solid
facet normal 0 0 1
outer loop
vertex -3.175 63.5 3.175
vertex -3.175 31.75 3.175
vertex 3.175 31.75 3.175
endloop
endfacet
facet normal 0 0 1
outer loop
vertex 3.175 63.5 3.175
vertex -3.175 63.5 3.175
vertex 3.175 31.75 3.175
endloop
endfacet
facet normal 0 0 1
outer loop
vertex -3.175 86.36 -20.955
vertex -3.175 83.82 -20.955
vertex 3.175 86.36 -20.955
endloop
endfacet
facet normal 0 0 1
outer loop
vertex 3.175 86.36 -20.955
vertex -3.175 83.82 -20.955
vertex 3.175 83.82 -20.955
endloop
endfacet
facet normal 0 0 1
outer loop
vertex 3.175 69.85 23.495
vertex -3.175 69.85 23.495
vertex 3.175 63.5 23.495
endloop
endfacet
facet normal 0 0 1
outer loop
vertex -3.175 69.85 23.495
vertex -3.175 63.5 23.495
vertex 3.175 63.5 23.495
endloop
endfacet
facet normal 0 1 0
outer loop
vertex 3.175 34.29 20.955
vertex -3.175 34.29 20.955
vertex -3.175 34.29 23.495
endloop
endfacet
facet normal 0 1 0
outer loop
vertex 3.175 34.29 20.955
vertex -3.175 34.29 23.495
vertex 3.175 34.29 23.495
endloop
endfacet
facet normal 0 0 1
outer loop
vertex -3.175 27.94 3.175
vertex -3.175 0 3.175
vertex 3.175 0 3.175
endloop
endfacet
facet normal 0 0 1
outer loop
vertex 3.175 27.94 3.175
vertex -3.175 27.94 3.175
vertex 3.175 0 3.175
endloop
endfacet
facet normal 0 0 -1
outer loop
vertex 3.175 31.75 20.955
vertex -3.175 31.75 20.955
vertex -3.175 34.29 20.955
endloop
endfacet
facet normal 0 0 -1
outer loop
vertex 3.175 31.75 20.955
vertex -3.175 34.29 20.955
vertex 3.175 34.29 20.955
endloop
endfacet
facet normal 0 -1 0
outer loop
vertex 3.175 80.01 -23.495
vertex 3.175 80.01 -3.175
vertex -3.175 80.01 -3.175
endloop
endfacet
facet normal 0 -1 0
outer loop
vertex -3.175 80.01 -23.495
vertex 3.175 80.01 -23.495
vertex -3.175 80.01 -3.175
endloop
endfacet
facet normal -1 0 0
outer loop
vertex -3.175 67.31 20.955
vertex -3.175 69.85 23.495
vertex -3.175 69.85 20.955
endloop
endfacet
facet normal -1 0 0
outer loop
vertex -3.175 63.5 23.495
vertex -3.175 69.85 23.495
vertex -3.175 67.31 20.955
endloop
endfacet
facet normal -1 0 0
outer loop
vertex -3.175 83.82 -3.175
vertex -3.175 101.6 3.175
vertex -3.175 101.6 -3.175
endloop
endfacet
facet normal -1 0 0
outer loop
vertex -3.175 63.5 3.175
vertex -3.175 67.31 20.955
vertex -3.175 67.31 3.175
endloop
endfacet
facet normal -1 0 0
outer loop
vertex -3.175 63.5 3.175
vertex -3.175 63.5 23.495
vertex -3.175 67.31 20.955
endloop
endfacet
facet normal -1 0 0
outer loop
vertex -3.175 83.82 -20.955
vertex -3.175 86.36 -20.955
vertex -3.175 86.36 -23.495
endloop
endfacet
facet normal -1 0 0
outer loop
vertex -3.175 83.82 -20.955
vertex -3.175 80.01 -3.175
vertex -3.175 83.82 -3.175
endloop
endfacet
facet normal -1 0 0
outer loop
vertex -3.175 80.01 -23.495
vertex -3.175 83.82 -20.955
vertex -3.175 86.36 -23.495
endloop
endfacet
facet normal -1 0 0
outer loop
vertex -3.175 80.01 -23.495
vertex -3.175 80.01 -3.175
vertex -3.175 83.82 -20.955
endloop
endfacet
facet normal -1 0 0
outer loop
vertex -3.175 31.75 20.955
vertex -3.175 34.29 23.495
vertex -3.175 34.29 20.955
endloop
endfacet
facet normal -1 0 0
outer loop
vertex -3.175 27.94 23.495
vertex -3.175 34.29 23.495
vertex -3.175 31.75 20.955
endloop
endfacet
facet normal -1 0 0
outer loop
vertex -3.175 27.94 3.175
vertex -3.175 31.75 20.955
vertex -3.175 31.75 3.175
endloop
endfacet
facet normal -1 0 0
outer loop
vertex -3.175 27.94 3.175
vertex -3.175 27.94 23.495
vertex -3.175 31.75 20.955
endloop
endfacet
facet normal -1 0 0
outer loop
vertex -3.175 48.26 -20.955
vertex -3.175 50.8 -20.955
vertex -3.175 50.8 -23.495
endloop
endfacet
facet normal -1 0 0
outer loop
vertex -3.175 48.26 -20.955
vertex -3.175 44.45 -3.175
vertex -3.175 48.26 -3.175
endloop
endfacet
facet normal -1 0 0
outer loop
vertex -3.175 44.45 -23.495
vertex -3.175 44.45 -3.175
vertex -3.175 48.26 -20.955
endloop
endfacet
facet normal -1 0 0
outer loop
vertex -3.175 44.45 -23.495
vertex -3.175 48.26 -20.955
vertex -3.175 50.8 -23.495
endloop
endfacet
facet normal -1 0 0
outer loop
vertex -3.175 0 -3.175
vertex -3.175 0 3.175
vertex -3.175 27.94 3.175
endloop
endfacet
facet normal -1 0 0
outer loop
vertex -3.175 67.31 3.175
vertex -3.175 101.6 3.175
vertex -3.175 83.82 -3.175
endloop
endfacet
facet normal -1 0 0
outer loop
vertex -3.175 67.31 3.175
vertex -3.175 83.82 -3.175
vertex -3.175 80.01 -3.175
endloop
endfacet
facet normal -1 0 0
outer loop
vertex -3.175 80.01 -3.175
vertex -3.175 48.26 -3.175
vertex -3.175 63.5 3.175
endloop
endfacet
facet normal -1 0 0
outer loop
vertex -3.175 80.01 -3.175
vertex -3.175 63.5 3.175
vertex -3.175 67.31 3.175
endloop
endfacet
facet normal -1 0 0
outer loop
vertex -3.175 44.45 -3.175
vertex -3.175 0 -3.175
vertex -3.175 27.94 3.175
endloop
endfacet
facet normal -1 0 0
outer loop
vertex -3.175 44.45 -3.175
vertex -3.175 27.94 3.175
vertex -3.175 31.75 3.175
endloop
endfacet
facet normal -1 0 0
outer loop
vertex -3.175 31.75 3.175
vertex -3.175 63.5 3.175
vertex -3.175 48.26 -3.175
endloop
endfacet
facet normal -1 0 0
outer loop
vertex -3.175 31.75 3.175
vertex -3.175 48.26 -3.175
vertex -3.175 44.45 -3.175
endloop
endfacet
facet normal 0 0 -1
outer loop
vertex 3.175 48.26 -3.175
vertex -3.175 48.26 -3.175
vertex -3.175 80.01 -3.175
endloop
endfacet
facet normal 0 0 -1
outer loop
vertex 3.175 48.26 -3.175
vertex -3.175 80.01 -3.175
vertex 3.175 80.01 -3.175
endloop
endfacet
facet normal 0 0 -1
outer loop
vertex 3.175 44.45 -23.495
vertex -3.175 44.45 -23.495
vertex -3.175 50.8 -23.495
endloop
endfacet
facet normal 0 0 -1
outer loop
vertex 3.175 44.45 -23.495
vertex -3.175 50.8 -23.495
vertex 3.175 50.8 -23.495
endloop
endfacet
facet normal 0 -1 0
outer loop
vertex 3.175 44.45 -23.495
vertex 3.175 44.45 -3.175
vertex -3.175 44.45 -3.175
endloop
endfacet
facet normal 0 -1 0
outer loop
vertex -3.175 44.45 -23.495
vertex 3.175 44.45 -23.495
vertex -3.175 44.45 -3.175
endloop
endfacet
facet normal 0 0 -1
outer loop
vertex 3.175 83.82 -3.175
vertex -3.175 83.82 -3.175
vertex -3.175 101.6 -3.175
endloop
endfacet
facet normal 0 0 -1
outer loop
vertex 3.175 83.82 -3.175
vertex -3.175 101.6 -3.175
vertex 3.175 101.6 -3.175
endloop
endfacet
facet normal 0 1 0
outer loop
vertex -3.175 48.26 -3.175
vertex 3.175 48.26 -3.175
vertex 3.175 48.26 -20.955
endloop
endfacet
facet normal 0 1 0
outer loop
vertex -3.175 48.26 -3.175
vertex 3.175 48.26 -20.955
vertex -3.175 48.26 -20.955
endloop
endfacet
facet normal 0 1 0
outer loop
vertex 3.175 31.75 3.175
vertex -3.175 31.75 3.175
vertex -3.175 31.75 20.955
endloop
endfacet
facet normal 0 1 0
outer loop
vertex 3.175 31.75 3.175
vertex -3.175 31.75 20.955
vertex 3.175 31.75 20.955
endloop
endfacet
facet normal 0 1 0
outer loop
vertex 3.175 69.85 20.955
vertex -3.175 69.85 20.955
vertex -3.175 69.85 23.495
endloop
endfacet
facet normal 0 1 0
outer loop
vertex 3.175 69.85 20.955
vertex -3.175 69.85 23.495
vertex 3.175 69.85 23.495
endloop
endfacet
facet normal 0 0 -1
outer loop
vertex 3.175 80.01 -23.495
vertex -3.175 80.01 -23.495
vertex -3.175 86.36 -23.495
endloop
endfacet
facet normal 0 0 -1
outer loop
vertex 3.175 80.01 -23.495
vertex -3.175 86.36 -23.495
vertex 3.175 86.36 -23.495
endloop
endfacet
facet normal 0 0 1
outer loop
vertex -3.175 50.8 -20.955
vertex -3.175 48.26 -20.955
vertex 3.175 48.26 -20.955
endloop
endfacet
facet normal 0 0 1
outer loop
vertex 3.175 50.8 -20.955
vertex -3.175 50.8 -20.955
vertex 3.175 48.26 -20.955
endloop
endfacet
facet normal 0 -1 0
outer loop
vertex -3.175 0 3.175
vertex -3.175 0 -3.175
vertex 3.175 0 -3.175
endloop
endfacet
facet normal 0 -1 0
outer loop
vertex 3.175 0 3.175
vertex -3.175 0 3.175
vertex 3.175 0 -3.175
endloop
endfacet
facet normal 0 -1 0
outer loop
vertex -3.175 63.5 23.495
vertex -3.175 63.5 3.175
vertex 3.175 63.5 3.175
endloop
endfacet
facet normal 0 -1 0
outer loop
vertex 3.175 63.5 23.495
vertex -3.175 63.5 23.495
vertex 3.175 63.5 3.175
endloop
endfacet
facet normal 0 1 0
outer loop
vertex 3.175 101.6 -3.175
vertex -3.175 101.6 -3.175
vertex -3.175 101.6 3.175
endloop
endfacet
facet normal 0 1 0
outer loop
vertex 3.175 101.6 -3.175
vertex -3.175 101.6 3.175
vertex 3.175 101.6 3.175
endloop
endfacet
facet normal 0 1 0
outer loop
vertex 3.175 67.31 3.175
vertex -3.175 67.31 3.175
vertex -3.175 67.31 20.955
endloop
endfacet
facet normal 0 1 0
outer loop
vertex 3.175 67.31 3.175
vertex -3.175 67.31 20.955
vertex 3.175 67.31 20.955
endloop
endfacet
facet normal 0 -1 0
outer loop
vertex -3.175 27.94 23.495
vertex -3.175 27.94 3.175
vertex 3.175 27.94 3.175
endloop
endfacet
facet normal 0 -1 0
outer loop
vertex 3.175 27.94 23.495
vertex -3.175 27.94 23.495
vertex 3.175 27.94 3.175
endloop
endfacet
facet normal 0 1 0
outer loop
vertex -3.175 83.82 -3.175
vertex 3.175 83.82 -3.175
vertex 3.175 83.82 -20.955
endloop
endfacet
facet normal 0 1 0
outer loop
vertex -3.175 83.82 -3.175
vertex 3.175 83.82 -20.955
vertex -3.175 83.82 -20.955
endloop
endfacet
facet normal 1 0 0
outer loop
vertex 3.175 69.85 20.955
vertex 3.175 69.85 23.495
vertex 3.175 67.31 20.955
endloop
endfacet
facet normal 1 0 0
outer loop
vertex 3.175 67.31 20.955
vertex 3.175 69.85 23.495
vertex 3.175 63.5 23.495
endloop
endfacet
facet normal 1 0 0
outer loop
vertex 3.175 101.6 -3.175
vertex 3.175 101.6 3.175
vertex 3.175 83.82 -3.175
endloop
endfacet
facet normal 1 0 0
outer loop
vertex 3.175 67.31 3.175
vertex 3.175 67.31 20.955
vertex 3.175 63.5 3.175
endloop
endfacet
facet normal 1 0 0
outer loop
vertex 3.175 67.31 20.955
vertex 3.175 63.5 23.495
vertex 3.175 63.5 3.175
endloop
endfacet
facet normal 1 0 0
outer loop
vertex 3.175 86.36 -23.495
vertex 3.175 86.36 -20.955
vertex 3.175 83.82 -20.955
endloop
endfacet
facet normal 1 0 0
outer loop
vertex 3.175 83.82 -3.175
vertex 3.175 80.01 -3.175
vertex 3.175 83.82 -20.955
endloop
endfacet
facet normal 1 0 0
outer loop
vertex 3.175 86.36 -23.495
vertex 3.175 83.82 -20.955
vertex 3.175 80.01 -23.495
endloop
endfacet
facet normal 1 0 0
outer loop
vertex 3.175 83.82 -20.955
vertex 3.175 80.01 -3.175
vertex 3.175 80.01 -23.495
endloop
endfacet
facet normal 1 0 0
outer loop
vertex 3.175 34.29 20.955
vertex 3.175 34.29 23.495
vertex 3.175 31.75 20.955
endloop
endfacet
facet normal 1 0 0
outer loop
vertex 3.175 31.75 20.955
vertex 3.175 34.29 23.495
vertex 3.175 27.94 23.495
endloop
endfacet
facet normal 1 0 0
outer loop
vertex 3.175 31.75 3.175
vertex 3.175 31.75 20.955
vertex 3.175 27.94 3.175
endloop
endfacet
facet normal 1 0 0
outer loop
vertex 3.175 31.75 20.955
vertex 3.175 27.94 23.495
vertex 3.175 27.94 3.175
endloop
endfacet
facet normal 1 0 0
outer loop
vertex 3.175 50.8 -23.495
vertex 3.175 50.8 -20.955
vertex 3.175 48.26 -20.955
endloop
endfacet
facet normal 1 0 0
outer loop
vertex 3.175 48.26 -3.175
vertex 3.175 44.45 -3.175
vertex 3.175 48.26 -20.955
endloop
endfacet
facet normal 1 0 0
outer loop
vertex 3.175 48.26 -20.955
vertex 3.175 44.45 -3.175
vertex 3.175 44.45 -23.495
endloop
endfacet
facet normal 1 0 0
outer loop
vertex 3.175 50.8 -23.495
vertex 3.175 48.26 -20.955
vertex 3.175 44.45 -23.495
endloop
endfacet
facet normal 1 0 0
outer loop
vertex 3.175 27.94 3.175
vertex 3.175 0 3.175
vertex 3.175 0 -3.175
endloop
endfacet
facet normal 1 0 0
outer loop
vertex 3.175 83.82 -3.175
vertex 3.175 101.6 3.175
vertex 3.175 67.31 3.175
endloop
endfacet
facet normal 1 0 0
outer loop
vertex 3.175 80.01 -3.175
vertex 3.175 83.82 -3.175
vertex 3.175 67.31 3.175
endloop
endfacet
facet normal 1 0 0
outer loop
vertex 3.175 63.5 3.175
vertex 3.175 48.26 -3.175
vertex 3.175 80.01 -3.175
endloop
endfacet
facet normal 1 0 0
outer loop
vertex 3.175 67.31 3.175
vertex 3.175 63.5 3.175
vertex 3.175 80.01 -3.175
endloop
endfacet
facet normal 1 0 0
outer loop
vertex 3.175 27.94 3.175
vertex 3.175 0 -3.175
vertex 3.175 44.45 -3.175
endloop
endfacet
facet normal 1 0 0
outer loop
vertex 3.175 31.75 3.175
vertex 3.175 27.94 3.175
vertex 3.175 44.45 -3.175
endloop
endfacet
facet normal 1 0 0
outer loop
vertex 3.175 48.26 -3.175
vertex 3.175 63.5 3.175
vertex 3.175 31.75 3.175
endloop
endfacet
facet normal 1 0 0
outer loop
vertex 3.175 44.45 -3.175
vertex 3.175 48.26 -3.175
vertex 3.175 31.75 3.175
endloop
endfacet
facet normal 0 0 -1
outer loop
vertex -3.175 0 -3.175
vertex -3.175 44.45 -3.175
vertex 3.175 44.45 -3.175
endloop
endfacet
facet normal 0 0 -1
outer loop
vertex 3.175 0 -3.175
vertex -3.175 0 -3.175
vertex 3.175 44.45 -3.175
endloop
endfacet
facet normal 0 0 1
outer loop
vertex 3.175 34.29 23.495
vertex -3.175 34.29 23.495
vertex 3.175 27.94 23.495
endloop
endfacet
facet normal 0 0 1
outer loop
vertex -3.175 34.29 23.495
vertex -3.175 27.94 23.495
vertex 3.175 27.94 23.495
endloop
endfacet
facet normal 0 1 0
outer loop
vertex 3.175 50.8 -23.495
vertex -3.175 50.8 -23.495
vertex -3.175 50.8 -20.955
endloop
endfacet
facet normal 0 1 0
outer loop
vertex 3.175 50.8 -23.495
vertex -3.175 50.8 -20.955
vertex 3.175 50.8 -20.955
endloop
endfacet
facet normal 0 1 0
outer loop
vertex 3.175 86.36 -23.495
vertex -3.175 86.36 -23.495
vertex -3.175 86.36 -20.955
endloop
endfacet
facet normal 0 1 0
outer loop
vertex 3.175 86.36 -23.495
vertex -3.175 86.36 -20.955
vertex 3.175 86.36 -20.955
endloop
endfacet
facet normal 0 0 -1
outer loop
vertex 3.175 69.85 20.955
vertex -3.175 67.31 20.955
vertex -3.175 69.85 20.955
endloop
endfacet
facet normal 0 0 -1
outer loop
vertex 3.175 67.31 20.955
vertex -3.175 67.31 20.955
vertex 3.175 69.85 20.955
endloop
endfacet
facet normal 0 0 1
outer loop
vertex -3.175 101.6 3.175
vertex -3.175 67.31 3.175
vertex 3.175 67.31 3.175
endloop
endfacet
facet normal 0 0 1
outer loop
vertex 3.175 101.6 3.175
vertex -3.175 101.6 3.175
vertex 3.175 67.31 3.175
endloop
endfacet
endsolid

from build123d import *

# Parameters (mm, degrees)
SKETCH1_W           = 6.35
SKETCH1_H           = 6.35
BOSS_EXTRUDE1_DEPTH = 101.6
SKETCH4_W           = 6.35
SKETCH4_H           = 3.81
BOSS_EXTRUDE2_DEPTH = 20.32
SKETCH5_W           = 6.35
SKETCH5_H           = 2.54
BOSS_EXTRUDE3_DEPTH = 2.54
SKETCH6_W           = 6.35
SKETCH6_H           = 3.81
BOSS_EXTRUDE4_DEPTH = 20.32
SKETCH7_W           = 6.35
SKETCH7_H           = 2.54
BOSS_EXTRUDE5_DEPTH = 2.54
SKETCH9_W           = 6.35
SKETCH9_H           = 2.54
BOSS_EXTRUDE6_DEPTH = 2.54
SKETCH8_W           = 6.35
SKETCH8_H           = 2.54
BOSS_EXTRUDE7_DEPTH = 2.54


with BuildPart() as part:
    # Sketch1 → Boss-Extrude1 (new body)
    with BuildSketch(Plane(origin=(0, 0, 0), x_dir=(1, 0, 0), z_dir=(0, 1, 0))):
        Rectangle(SKETCH1_W, SKETCH1_H)
    extrude(amount=BOSS_EXTRUDE1_DEPTH)

    # Sketch4 → Boss-Extrude2 (add)
    with BuildSketch(Plane.XY.offset(3.175)):
        with Locations((0, 29.845)):
            Rectangle(SKETCH4_W, SKETCH4_H)
        with Locations((0, 65.405)):
            Rectangle(SKETCH4_W, SKETCH4_H)
    extrude(amount=BOSS_EXTRUDE2_DEPTH)

    # Sketch5 → Boss-Extrude3 (add)
    with BuildSketch(Plane(origin=(0, 31.75, 0), x_dir=(1, 0, 0), z_dir=(0, 1, 0))):
        with Locations((0, -22.225)):
            Rectangle(SKETCH5_W, SKETCH5_H)
    extrude(amount=BOSS_EXTRUDE3_DEPTH)

    # Sketch6 → Boss-Extrude4 (add)
    with BuildSketch(Plane(origin=(0, 0, -3.175), x_dir=(-1, 0, 0), z_dir=(0, 0, -1))):
        with Locations((0, 81.915)):
            Rectangle(SKETCH6_W, SKETCH6_H)
        with Locations((0, 46.355)):
            Rectangle(SKETCH6_W, SKETCH6_H)
    extrude(amount=BOSS_EXTRUDE4_DEPTH)

    # Sketch7 → Boss-Extrude5 (add)
    with BuildSketch(Plane(origin=(0, 48.26, 0), x_dir=(1, 0, 0), z_dir=(0, 1, 0))):
        with Locations((0, 22.225)):
            Rectangle(SKETCH7_W, SKETCH7_H)
    extrude(amount=BOSS_EXTRUDE5_DEPTH)

    # Sketch9 → Boss-Extrude6 (add)
    with BuildSketch(Plane(origin=(0, 83.82, 0), x_dir=(1, 0, 0), z_dir=(0, 1, 0))):
        with Locations((0, 22.225)):
            Rectangle(SKETCH9_W, SKETCH9_H)
    extrude(amount=BOSS_EXTRUDE6_DEPTH)

    # Sketch8 → Boss-Extrude7 (add)
    with BuildSketch(Plane(origin=(0, 67.31, 0), x_dir=(1, 0, 0), z_dir=(0, 1, 0))):
        with Locations((0, -22.225)):
            Rectangle(SKETCH8_W, SKETCH8_H)
    extrude(amount=BOSS_EXTRUDE7_DEPTH)


solid = part.part
